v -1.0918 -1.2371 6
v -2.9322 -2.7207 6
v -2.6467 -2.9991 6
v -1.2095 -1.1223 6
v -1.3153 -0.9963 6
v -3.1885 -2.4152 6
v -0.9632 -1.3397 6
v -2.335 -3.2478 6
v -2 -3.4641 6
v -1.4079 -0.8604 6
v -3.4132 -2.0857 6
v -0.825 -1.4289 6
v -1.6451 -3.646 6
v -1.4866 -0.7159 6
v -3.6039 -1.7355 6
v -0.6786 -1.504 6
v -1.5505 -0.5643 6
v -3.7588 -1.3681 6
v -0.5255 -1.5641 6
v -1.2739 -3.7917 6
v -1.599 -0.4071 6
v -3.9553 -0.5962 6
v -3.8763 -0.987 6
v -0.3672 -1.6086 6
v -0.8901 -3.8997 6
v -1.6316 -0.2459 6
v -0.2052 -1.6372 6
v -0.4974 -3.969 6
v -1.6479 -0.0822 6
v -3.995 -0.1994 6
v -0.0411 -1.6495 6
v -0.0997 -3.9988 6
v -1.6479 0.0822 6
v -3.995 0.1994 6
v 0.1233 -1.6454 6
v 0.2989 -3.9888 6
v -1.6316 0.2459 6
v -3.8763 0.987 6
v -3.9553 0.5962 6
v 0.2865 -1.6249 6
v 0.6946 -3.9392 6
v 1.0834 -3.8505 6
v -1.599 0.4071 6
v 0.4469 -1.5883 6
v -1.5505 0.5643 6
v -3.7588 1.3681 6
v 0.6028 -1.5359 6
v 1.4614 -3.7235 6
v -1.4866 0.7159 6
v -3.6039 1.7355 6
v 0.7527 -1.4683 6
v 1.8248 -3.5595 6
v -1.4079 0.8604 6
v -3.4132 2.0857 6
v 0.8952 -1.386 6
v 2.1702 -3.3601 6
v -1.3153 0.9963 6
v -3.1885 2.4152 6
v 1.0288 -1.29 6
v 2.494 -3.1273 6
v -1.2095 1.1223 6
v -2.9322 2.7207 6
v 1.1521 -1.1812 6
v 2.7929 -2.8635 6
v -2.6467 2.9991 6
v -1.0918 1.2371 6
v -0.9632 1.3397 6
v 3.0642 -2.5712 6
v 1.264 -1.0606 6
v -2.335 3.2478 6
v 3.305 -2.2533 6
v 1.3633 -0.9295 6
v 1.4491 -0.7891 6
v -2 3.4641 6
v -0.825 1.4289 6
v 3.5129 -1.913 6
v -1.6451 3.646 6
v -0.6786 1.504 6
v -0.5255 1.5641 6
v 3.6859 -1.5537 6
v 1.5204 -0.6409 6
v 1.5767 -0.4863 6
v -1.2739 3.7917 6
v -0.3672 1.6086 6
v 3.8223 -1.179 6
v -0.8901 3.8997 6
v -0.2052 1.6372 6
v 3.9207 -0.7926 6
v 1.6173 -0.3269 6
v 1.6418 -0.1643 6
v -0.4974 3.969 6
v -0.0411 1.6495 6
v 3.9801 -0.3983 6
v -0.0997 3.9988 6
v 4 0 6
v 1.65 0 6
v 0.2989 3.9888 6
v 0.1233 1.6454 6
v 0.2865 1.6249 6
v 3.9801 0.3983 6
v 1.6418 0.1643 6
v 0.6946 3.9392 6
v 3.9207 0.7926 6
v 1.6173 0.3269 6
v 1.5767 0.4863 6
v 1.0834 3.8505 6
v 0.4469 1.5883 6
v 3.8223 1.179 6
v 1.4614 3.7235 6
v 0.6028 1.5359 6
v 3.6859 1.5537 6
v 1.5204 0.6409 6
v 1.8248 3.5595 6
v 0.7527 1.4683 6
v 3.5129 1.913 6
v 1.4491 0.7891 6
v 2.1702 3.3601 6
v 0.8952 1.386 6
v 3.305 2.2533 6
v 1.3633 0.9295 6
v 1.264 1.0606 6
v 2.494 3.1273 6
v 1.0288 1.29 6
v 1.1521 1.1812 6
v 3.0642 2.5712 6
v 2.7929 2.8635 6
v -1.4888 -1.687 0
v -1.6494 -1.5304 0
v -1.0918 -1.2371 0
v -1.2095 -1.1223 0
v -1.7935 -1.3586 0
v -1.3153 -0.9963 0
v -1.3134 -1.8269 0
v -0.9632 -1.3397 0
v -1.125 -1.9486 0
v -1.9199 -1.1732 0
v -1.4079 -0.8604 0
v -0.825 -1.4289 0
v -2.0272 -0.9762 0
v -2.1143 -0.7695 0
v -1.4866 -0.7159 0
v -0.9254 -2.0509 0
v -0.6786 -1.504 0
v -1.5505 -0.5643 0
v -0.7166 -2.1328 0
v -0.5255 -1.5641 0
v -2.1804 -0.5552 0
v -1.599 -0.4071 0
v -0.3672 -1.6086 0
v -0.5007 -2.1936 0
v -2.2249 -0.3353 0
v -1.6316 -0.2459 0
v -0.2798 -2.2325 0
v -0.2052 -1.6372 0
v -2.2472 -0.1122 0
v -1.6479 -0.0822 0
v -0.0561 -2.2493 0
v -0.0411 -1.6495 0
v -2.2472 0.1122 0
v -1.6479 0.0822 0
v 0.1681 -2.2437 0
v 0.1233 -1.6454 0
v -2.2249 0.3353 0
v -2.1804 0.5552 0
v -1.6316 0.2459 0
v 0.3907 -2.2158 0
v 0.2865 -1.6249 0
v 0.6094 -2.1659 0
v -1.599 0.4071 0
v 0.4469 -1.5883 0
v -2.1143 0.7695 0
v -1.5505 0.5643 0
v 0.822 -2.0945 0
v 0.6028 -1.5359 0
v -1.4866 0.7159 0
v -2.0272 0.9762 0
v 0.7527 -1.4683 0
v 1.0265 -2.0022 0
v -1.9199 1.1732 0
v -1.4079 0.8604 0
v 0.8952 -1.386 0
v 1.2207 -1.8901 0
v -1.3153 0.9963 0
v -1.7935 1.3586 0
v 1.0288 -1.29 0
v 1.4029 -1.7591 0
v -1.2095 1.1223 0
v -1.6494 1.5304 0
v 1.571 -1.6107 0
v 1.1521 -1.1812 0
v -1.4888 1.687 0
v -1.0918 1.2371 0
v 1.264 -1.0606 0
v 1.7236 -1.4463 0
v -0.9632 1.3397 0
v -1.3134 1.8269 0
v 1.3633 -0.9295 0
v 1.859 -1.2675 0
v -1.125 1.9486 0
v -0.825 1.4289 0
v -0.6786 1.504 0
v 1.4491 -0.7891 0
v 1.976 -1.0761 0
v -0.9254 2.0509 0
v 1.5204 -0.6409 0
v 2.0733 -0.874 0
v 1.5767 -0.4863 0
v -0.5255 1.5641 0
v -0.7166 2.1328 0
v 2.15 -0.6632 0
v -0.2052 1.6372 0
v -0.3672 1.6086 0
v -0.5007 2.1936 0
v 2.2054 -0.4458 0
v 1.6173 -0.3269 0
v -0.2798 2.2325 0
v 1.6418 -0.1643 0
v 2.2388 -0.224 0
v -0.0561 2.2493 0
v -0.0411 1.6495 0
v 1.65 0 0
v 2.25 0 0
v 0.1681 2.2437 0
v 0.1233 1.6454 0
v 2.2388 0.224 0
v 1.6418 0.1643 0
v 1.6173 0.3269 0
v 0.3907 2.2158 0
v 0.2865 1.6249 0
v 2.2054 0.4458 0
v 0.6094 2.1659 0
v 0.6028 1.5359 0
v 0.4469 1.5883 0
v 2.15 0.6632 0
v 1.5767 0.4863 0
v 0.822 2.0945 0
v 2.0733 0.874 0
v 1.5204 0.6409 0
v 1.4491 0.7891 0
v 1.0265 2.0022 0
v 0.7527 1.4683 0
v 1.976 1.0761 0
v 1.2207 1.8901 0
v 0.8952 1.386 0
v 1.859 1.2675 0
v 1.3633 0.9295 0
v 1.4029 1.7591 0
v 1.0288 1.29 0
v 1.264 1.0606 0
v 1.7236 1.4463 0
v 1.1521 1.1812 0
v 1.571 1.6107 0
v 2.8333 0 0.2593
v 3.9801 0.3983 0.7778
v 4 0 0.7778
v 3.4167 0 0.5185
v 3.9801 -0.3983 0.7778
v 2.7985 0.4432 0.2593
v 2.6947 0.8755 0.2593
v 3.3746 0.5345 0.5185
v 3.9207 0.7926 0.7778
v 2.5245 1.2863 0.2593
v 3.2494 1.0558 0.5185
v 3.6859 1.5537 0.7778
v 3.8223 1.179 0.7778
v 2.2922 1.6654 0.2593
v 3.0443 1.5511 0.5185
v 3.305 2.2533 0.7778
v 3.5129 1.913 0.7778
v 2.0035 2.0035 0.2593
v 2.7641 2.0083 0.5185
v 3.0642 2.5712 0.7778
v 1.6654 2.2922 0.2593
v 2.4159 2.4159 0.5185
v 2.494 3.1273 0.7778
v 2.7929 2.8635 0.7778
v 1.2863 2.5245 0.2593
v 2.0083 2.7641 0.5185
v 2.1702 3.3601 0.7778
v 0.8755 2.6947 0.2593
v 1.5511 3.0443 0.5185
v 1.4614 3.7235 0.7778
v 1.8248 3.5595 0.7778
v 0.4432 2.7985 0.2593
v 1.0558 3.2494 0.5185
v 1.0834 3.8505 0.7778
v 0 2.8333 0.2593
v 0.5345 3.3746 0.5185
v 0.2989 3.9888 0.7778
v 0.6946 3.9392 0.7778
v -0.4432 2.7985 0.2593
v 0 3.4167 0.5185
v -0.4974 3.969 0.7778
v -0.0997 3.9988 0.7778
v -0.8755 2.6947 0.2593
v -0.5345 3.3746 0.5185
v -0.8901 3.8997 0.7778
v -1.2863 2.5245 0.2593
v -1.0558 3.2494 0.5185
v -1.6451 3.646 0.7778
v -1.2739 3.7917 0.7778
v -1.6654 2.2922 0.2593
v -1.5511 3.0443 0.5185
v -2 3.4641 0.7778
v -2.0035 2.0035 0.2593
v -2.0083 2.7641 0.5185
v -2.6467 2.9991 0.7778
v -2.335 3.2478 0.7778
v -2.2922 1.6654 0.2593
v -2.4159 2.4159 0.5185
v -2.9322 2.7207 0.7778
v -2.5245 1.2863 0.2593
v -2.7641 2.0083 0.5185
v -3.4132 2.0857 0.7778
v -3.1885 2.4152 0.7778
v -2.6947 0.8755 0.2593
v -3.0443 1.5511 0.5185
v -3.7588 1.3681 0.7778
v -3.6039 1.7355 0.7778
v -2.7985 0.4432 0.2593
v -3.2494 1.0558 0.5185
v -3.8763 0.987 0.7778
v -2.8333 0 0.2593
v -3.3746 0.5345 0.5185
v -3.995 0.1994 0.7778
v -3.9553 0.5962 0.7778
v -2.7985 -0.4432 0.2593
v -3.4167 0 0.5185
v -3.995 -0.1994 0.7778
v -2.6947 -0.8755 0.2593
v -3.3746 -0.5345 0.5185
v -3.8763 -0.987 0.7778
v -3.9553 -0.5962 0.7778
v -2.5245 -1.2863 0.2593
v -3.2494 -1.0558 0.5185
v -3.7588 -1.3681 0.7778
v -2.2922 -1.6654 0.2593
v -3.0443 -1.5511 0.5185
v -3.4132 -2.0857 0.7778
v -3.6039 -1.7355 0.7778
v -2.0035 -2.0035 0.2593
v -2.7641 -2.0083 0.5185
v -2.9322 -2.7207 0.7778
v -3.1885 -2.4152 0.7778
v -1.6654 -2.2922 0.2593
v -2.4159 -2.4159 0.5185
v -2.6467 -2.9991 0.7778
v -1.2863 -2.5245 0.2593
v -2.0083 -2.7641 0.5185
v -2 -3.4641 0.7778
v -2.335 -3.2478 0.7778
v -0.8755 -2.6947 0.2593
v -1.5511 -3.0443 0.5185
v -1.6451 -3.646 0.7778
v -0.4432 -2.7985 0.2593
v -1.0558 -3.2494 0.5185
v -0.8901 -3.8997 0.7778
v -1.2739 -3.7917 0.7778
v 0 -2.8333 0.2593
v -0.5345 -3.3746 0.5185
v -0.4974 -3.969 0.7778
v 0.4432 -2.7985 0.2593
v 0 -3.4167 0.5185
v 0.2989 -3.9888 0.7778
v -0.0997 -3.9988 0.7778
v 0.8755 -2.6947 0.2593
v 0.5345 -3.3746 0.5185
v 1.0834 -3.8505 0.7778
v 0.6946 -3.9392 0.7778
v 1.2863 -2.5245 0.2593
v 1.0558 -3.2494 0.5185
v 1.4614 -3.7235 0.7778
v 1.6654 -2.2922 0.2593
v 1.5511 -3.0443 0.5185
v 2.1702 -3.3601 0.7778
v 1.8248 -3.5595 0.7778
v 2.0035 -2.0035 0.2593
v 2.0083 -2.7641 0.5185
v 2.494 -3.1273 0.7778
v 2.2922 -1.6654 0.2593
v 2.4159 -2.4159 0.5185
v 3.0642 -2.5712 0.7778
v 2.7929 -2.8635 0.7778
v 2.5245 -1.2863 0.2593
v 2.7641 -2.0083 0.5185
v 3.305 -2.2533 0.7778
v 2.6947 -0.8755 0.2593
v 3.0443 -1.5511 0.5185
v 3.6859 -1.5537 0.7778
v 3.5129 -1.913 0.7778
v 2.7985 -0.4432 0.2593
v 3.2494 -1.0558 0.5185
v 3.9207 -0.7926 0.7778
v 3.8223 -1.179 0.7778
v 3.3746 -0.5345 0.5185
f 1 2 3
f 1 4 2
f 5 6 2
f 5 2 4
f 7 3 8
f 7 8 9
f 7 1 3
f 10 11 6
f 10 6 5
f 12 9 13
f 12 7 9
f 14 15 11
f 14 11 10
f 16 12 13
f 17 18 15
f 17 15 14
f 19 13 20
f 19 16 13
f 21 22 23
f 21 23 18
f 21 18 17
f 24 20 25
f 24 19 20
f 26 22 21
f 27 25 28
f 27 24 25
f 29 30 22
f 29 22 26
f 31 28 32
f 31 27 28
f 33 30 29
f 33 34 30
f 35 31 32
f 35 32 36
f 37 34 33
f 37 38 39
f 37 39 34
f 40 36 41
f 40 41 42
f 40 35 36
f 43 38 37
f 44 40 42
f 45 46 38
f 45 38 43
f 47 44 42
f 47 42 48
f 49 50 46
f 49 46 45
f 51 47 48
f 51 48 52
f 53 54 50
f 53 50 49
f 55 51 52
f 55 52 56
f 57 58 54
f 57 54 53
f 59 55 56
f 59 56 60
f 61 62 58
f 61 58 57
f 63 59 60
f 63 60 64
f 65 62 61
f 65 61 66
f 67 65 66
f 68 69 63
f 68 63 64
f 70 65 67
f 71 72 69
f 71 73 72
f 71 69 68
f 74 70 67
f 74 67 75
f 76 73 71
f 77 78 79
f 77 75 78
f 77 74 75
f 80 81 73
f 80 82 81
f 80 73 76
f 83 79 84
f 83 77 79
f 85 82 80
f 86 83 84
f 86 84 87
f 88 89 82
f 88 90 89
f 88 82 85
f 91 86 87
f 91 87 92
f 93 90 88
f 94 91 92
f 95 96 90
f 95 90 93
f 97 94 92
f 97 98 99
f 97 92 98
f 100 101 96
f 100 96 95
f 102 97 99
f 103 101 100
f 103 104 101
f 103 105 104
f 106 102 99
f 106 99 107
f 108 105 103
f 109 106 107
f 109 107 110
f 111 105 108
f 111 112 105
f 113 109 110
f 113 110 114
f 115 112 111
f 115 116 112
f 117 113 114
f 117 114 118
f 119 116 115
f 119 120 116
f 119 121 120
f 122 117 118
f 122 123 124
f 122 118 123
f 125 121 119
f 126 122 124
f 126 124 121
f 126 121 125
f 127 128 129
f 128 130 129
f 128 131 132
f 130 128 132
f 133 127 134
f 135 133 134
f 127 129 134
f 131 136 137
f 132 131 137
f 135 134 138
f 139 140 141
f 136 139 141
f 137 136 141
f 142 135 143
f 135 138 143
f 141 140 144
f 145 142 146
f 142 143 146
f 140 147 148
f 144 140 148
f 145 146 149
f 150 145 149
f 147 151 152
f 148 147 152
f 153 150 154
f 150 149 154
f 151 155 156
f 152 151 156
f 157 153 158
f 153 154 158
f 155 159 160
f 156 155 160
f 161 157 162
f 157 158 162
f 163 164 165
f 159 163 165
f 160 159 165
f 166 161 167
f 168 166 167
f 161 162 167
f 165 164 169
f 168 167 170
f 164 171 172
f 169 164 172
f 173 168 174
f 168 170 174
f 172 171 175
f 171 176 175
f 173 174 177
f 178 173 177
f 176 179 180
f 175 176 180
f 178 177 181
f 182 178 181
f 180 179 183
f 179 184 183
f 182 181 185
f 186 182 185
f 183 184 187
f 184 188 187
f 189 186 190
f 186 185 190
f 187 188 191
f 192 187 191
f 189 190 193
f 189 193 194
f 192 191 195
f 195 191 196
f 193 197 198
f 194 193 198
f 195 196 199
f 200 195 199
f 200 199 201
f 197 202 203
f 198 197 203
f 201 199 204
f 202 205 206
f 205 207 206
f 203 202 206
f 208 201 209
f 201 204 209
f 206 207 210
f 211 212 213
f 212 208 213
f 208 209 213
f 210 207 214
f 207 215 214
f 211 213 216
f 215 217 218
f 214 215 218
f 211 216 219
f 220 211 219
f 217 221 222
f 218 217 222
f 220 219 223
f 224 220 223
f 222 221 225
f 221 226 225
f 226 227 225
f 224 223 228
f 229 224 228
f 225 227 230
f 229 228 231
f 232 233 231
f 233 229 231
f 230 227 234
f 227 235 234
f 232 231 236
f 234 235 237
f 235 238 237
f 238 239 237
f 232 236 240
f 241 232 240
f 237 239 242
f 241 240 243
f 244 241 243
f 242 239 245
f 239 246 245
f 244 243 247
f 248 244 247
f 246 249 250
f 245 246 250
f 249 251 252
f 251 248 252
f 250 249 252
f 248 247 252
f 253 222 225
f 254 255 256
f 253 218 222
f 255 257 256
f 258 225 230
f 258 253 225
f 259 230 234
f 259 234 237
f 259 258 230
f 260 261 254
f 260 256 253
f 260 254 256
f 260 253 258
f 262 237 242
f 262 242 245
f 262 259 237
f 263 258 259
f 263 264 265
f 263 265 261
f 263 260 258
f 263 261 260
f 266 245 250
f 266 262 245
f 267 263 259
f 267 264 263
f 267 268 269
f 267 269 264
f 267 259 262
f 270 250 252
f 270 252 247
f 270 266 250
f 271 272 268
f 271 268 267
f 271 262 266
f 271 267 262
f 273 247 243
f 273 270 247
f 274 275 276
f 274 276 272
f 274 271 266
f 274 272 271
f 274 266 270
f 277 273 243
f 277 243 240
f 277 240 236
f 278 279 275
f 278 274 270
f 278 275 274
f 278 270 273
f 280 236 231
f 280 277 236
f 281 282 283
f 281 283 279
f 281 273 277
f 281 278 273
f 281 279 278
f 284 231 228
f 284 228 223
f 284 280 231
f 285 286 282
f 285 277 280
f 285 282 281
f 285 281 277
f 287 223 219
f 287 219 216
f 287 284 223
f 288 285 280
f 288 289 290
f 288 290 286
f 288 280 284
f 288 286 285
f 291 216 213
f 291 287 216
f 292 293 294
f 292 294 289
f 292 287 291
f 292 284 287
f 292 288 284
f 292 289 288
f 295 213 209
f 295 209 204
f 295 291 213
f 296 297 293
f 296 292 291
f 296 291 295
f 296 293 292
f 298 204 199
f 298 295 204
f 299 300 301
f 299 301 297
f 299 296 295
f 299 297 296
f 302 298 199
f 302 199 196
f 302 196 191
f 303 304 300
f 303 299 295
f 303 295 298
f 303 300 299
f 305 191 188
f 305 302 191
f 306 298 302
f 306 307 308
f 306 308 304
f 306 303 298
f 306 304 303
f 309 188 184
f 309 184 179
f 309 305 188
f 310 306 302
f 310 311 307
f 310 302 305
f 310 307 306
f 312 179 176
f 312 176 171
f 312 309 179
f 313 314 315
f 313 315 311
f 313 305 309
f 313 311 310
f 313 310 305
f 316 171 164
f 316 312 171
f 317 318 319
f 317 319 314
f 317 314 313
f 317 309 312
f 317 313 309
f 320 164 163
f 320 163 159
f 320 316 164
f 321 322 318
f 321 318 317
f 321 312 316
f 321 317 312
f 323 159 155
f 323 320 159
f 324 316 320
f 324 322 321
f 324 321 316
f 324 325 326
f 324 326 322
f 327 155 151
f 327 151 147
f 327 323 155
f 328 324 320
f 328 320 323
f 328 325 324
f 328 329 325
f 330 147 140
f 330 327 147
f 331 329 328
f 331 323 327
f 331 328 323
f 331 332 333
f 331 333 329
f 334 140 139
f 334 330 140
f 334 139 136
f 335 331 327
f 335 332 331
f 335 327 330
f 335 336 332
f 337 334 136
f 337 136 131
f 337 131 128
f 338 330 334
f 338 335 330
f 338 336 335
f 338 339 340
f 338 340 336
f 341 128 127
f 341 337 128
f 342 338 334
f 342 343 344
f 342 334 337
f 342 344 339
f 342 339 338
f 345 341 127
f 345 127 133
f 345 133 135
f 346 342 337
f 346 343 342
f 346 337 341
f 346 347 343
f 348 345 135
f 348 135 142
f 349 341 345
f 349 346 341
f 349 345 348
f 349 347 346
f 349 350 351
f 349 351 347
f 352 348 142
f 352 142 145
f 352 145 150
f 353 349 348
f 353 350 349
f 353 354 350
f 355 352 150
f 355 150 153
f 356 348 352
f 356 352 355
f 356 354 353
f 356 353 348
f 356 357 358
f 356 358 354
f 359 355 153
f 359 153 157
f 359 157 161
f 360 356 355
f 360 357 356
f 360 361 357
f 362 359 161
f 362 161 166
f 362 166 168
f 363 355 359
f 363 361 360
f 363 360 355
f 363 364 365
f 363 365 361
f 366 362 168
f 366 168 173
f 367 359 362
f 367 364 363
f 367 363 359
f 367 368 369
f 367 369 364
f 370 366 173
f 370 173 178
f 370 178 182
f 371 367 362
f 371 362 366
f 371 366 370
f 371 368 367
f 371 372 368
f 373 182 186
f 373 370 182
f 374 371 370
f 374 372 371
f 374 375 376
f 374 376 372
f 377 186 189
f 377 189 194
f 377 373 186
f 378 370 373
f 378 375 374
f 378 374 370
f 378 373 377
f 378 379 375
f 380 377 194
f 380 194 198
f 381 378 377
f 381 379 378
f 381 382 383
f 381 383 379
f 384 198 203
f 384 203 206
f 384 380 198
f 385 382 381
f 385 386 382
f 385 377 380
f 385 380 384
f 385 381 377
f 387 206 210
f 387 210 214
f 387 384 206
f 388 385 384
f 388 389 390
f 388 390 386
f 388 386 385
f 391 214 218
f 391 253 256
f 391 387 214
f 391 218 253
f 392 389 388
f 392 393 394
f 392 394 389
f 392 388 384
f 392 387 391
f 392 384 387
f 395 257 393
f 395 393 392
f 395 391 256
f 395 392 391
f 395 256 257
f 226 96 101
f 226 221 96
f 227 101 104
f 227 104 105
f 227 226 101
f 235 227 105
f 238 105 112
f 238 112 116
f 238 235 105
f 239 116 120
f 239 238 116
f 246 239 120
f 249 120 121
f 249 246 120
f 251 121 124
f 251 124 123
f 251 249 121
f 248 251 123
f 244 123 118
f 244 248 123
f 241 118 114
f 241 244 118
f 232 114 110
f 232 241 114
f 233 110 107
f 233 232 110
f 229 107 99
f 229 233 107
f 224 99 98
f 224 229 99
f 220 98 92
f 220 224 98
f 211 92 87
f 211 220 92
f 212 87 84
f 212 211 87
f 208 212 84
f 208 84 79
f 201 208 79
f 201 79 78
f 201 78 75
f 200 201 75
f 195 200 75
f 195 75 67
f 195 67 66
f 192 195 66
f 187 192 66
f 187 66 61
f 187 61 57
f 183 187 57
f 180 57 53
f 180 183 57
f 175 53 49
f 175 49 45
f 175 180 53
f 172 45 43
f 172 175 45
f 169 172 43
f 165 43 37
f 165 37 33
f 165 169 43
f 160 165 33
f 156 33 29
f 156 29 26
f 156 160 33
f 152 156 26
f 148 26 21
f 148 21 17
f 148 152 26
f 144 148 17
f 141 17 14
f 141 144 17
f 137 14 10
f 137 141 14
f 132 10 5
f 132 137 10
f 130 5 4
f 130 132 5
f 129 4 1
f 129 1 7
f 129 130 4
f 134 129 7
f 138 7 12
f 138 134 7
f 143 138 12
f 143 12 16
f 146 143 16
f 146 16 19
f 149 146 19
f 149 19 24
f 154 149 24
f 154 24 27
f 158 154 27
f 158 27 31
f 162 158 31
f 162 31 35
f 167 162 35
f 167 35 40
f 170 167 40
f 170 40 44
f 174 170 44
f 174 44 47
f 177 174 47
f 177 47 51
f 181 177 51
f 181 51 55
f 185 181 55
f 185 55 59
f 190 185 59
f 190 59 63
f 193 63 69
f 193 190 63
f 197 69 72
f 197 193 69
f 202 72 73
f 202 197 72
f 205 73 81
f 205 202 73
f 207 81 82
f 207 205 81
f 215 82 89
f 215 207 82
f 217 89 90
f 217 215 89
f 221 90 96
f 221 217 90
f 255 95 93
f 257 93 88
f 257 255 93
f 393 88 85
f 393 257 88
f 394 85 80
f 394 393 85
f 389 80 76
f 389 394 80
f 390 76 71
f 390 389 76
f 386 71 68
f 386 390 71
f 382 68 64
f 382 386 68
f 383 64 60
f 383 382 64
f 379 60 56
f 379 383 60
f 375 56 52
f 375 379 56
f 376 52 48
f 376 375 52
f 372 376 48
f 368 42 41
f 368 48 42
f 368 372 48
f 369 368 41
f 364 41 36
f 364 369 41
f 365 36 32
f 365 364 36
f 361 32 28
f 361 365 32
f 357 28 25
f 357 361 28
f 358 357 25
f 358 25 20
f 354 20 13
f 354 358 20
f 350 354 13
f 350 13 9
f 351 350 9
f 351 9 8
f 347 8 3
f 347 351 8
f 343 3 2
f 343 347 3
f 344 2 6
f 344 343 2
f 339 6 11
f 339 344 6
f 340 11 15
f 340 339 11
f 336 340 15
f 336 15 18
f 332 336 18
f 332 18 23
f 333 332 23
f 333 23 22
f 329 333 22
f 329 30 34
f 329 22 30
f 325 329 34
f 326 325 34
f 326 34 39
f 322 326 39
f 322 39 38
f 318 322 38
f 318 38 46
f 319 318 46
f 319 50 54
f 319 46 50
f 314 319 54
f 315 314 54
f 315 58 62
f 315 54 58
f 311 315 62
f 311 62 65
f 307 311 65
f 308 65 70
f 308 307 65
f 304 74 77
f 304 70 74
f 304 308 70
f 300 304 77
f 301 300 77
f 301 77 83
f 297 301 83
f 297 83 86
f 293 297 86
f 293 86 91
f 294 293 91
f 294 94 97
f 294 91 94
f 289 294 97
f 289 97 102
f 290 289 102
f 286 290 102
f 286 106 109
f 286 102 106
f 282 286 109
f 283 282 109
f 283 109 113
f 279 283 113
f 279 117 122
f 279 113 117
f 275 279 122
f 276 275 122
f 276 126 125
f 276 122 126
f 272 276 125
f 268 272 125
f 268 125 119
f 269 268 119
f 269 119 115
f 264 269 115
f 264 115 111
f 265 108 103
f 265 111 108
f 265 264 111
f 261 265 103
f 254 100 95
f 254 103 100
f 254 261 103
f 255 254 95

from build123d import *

# Parameters (mm, degrees)
SKETCH1_R           = 2.25
SKETCH1_R_2         = 1.65
BOSS_EXTRUDE1_DEPTH = 1
SKETCH2_R           = 4
SKETCH2_R_2         = 1.65
BOSS_EXTRUDE2_DEPTH = 5
CHAMFER1_SIZE       = 1
CHAMFER1_SIZE_2     = 2.25


with BuildPart() as part:
    # Sketch1 → Boss-Extrude1 (new body)
    with BuildSketch(Plane.XY):
        Circle(SKETCH1_R)
        Circle(SKETCH1_R_2, mode=Mode.SUBTRACT)
    extrude(amount=BOSS_EXTRUDE1_DEPTH)

    # Sketch2 → Boss-Extrude2 (add)
    with BuildSketch(Plane.XY.offset(1)):
        Circle(SKETCH2_R)
        Circle(SKETCH2_R_2, mode=Mode.SUBTRACT)
    extrude(amount=BOSS_EXTRUDE2_DEPTH)

    # Chamfer1
    # the kernel refuses this chamfer: 2.25, 1 mm, written as the material it adds along each edge
    with BuildSketch(Plane(origin=(0, 0, 1), x_dir=(1, 0, 0), z_dir=(0, -1, 0))) as chamfer1_piece_1_section:
        Polygon((2.25, -CHAMFER1_SIZE), (2.25 + CHAMFER1_SIZE_2, 0), (2.25, 0), align=None)
    chamfer1_piece_1 = revolve(axis=Axis((0, 0, 1), (0, 0, 1)), mode=Mode.PRIVATE)
    chamfer1_piece_1 = split(chamfer1_piece_1, bisect_by=Plane(origin=(-3.113599445, 0, 0), z_dir=(0, 0, 1)), keep=Keep.TOP, mode=Mode.PRIVATE)
    chamfer1_piece_1 = chamfer1_piece_1 & Plane(origin=(0, 0, 0.414540138), x_dir=(1, 0, 0), z_dir=(0, 0, -1)) * Cylinder(4, 18, mode=Mode.PRIVATE)
    add(chamfer1_piece_1)


solid = part.part
